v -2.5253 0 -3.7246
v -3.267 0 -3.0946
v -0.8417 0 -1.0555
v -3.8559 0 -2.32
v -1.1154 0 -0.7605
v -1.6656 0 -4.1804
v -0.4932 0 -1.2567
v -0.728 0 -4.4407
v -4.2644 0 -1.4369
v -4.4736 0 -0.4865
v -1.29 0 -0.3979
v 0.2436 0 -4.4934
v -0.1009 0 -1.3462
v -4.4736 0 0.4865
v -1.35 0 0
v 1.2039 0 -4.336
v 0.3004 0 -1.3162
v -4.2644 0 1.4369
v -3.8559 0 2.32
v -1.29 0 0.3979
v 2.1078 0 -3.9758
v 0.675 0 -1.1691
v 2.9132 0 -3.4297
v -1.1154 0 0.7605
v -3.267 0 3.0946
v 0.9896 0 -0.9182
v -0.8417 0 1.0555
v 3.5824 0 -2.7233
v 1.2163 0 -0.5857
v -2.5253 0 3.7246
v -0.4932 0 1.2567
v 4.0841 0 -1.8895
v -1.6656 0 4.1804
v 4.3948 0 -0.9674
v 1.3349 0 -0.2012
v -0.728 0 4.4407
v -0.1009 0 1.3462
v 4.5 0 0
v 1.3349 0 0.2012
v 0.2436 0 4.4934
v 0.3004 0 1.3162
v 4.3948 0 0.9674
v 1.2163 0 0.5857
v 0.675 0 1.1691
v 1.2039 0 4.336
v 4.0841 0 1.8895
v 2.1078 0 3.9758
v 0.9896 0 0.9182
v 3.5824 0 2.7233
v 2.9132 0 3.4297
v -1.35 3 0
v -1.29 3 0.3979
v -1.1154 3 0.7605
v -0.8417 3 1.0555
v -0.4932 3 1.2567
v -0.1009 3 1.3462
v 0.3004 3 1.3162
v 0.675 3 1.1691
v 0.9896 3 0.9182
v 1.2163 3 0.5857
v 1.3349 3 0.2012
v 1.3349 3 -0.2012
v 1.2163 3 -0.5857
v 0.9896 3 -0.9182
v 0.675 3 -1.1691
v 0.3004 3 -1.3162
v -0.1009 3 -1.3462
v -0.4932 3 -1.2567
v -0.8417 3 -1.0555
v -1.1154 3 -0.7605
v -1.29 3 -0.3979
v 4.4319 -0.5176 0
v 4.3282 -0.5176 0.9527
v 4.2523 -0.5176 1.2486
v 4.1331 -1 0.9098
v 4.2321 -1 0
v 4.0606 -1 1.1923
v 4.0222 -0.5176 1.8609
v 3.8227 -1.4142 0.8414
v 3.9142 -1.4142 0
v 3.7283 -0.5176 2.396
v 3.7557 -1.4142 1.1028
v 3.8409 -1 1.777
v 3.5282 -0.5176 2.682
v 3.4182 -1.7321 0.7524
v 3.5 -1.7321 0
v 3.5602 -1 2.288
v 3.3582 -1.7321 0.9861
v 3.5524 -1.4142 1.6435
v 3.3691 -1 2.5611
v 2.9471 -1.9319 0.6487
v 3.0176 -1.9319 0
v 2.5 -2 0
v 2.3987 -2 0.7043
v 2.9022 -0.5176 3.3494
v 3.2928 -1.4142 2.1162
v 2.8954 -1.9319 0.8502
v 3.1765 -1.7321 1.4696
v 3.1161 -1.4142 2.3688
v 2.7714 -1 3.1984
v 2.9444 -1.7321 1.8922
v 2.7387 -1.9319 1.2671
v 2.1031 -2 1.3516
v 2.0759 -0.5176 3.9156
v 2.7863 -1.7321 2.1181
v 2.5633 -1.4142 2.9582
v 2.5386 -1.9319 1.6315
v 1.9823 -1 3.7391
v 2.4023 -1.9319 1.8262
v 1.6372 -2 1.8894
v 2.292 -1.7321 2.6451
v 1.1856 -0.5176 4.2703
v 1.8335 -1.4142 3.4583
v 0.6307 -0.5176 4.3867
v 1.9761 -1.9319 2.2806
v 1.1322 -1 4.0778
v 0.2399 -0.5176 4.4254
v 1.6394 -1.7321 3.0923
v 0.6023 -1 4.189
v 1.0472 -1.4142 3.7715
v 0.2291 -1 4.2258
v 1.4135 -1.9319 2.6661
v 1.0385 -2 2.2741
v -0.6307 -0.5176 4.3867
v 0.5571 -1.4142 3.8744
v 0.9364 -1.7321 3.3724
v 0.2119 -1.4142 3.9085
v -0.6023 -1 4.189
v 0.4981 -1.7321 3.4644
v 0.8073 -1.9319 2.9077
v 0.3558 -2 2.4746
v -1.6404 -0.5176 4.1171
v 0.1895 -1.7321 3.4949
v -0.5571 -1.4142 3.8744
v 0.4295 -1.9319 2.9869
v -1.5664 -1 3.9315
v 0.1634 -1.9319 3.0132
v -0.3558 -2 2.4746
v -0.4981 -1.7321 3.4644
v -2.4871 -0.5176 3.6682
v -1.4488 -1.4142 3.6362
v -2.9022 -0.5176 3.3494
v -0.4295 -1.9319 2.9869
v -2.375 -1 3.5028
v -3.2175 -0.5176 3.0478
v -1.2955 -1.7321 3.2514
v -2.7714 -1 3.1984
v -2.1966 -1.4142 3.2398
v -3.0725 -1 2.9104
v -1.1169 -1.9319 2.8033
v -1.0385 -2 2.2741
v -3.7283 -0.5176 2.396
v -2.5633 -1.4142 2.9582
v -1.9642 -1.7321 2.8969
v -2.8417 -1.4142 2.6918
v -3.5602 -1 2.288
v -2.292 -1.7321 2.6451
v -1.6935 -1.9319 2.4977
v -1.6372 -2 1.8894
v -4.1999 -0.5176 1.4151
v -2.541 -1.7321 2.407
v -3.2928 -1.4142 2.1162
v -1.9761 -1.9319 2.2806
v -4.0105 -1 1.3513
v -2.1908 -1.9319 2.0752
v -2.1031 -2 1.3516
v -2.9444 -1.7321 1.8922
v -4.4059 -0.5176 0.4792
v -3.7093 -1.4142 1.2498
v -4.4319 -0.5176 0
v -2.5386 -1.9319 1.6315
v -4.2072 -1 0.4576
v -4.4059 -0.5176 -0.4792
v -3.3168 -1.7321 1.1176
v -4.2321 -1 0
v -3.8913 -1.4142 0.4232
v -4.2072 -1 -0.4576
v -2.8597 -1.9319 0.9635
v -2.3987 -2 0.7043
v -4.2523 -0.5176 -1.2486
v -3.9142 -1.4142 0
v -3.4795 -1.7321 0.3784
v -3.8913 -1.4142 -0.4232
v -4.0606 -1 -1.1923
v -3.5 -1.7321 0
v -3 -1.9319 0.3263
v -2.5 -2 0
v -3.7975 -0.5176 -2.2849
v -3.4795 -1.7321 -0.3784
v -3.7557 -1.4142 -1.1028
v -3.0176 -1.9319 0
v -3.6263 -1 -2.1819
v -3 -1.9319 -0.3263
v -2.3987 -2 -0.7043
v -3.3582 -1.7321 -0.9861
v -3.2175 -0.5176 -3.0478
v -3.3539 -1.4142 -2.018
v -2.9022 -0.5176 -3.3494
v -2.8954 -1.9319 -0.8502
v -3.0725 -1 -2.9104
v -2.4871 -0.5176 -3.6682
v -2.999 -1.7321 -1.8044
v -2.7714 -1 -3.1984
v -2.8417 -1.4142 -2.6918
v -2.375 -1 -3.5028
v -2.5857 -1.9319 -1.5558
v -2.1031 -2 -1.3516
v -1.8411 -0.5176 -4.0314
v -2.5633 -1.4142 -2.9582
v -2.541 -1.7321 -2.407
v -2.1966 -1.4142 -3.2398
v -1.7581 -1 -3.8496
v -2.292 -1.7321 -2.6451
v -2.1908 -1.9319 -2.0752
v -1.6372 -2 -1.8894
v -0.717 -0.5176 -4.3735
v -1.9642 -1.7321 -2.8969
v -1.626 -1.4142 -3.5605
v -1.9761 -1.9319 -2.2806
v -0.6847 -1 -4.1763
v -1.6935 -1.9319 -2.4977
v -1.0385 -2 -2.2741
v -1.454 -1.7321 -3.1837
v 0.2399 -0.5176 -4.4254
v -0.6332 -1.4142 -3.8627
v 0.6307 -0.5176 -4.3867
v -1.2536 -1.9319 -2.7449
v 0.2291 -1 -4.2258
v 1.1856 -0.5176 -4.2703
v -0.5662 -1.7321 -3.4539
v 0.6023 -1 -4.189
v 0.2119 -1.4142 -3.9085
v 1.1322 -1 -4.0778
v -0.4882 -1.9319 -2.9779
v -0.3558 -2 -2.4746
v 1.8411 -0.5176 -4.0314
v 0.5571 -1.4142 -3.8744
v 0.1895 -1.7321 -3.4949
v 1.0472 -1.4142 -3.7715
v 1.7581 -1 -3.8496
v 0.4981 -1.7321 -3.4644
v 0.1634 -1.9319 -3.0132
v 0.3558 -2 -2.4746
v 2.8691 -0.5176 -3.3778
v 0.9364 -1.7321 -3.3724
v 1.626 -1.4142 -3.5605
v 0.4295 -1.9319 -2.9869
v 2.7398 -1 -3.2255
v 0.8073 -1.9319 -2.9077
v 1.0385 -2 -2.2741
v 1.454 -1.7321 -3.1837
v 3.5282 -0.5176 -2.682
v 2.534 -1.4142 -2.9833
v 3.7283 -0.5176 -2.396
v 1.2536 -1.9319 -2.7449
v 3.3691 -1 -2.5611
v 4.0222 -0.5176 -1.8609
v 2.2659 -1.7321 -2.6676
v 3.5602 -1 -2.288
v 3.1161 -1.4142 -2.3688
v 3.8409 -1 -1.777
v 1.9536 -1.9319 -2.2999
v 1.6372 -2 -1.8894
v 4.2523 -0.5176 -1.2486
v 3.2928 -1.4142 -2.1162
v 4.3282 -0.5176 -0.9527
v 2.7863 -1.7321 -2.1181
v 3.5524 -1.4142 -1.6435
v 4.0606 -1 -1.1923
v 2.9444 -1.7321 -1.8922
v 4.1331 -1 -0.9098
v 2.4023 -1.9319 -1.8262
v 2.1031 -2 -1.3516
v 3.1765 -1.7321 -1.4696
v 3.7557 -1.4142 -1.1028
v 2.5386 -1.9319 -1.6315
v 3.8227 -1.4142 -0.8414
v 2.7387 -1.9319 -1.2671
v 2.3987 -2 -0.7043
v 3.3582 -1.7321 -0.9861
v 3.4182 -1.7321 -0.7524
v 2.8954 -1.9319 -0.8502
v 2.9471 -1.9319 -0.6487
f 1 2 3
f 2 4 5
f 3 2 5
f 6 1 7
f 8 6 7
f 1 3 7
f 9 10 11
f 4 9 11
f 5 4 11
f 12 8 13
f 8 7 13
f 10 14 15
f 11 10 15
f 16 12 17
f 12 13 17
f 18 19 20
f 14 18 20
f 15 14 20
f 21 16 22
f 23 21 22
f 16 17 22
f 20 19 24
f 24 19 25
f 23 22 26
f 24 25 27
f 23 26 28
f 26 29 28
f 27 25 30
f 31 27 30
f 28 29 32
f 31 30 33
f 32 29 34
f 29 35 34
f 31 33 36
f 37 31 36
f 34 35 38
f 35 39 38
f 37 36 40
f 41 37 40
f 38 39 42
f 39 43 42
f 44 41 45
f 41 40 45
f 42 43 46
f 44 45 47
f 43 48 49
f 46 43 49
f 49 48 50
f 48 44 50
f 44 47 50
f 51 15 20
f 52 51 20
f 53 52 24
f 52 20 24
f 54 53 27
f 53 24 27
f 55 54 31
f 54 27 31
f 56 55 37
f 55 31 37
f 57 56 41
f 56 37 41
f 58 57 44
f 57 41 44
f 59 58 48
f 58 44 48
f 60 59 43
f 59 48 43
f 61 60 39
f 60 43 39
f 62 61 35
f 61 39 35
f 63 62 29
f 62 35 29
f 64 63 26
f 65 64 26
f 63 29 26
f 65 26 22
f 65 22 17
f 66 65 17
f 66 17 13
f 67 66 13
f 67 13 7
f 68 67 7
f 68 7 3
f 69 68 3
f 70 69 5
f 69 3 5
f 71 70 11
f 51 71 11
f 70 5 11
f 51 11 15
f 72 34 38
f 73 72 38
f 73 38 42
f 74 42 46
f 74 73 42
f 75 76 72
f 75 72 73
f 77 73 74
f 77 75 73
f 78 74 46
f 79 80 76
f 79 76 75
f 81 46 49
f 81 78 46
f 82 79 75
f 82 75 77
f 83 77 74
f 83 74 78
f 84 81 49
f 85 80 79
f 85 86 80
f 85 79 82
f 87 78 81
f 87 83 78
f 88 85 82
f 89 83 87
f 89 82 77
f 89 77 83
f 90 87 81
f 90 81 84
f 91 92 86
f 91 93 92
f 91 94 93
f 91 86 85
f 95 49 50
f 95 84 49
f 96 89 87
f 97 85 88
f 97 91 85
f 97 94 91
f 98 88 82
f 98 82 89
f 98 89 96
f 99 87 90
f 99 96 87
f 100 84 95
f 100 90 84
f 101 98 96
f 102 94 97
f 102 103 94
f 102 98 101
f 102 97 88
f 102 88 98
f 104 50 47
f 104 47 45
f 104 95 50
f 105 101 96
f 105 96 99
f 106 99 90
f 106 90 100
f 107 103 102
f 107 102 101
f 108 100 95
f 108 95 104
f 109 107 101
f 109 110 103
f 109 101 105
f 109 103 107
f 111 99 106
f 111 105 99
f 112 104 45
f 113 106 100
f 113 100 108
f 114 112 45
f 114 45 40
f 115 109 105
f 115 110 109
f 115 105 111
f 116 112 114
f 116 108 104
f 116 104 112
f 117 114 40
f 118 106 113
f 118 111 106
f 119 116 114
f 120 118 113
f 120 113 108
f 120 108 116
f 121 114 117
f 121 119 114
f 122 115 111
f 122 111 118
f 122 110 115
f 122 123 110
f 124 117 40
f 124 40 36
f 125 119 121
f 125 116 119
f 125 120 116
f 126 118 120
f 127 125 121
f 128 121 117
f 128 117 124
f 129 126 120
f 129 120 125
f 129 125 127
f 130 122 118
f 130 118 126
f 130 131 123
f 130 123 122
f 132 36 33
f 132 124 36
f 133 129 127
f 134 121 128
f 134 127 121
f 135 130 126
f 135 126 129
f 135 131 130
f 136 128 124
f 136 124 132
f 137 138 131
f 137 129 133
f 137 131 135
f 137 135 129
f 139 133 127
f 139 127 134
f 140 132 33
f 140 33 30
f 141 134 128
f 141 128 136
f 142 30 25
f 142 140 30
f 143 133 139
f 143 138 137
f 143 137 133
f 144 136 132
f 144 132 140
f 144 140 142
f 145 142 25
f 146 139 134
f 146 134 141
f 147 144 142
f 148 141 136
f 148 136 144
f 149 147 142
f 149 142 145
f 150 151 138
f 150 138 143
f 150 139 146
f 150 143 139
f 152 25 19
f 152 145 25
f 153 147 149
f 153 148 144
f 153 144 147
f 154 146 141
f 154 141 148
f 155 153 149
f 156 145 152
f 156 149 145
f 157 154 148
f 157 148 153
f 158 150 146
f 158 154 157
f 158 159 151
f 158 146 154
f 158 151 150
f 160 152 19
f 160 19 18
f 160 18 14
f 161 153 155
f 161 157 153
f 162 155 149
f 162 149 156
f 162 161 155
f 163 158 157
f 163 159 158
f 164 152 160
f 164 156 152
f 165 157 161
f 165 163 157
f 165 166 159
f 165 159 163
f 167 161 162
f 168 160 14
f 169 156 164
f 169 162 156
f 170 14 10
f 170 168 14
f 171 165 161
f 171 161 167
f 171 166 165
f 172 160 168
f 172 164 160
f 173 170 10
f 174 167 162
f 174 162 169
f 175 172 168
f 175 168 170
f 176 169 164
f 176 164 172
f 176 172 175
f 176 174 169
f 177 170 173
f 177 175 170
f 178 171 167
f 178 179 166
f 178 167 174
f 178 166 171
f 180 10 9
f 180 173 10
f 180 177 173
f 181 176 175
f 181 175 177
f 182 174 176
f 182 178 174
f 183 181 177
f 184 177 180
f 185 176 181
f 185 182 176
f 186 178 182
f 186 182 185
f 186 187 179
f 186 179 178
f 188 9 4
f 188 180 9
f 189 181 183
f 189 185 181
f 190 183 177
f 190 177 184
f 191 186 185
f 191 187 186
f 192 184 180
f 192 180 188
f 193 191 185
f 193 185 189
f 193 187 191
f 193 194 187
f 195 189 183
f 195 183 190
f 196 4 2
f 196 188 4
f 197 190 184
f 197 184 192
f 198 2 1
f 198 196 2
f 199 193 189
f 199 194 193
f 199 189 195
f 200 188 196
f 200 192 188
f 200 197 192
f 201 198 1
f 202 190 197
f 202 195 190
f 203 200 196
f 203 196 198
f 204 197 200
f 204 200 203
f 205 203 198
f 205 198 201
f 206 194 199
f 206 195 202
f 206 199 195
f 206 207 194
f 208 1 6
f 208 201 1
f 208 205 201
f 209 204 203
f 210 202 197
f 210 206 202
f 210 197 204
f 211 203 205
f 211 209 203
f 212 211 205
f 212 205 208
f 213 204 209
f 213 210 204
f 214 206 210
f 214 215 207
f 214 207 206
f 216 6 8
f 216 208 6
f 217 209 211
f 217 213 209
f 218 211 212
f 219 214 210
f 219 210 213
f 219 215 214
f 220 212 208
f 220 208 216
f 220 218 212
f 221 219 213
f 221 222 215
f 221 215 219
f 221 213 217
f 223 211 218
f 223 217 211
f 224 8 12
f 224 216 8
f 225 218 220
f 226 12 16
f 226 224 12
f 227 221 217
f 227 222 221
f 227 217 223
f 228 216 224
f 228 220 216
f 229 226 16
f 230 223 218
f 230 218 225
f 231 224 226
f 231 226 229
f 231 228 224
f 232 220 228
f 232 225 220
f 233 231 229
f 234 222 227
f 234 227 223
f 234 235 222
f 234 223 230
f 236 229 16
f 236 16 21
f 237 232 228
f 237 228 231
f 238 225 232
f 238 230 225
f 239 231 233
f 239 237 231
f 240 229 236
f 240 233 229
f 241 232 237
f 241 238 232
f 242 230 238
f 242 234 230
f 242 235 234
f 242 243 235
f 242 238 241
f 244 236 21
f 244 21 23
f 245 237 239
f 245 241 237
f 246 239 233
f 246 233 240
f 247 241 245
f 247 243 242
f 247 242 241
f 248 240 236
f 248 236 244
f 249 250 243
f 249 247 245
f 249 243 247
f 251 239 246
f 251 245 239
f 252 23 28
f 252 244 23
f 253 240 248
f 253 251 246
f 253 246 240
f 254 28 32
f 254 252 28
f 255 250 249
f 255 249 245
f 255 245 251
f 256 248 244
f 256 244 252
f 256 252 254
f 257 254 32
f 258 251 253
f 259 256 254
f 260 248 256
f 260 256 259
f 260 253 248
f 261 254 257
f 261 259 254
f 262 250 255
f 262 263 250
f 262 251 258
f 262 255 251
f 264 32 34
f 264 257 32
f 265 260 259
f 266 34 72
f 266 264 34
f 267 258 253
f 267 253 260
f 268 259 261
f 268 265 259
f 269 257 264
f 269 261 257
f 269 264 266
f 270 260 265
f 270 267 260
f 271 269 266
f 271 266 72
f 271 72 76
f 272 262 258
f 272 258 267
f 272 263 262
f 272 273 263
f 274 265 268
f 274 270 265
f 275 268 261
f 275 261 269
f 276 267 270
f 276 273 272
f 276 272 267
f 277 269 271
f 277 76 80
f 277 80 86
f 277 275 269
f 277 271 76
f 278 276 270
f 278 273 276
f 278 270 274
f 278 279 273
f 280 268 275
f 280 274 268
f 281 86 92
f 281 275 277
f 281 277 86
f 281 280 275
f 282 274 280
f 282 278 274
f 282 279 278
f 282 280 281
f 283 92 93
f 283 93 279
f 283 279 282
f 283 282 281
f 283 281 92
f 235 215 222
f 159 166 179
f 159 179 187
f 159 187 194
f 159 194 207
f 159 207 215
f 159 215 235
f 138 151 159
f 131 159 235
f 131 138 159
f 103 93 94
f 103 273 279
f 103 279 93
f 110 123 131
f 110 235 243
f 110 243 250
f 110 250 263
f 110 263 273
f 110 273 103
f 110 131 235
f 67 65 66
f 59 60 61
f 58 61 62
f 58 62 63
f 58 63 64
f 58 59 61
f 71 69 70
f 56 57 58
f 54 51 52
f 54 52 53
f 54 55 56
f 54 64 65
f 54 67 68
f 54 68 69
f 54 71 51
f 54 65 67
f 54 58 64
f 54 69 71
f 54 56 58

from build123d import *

# Parameters (mm, degrees)
F0_R     = 4.5
F1_DEPTH = 2
F2_R     = 1.99999
F3_R     = 1.35
F4_DEPTH = 3


# Not quite as in the source:
# - a fillet or chamfer is up to 0.001 mm smaller than in the source, because OpenCascade refuses the exact size


with BuildPart() as f1:
    # F0 (on Front) → F1 (new body)
    with BuildSketch(Plane.XZ):
        Circle(F0_R)
    extrude(amount=F1_DEPTH)

    # F2 (radius 2 in the source; OpenCascade refuses exactly that, so slightly less here)
    f2_edges = [f1.edges().sort_by_distance(p)[0] for p in [
        (-4.5, -2, 0),
    ]]
    fillet(f2_edges, radius=F2_R)

    # F3 (on face) → F4 (join)
    with BuildSketch(Plane(origin=(0, 0, 0), x_dir=(-1, 0, 0), z_dir=(0, 1, 0))):
        Circle(F3_R)
    extrude(amount=F4_DEPTH)


solid = f1.part
